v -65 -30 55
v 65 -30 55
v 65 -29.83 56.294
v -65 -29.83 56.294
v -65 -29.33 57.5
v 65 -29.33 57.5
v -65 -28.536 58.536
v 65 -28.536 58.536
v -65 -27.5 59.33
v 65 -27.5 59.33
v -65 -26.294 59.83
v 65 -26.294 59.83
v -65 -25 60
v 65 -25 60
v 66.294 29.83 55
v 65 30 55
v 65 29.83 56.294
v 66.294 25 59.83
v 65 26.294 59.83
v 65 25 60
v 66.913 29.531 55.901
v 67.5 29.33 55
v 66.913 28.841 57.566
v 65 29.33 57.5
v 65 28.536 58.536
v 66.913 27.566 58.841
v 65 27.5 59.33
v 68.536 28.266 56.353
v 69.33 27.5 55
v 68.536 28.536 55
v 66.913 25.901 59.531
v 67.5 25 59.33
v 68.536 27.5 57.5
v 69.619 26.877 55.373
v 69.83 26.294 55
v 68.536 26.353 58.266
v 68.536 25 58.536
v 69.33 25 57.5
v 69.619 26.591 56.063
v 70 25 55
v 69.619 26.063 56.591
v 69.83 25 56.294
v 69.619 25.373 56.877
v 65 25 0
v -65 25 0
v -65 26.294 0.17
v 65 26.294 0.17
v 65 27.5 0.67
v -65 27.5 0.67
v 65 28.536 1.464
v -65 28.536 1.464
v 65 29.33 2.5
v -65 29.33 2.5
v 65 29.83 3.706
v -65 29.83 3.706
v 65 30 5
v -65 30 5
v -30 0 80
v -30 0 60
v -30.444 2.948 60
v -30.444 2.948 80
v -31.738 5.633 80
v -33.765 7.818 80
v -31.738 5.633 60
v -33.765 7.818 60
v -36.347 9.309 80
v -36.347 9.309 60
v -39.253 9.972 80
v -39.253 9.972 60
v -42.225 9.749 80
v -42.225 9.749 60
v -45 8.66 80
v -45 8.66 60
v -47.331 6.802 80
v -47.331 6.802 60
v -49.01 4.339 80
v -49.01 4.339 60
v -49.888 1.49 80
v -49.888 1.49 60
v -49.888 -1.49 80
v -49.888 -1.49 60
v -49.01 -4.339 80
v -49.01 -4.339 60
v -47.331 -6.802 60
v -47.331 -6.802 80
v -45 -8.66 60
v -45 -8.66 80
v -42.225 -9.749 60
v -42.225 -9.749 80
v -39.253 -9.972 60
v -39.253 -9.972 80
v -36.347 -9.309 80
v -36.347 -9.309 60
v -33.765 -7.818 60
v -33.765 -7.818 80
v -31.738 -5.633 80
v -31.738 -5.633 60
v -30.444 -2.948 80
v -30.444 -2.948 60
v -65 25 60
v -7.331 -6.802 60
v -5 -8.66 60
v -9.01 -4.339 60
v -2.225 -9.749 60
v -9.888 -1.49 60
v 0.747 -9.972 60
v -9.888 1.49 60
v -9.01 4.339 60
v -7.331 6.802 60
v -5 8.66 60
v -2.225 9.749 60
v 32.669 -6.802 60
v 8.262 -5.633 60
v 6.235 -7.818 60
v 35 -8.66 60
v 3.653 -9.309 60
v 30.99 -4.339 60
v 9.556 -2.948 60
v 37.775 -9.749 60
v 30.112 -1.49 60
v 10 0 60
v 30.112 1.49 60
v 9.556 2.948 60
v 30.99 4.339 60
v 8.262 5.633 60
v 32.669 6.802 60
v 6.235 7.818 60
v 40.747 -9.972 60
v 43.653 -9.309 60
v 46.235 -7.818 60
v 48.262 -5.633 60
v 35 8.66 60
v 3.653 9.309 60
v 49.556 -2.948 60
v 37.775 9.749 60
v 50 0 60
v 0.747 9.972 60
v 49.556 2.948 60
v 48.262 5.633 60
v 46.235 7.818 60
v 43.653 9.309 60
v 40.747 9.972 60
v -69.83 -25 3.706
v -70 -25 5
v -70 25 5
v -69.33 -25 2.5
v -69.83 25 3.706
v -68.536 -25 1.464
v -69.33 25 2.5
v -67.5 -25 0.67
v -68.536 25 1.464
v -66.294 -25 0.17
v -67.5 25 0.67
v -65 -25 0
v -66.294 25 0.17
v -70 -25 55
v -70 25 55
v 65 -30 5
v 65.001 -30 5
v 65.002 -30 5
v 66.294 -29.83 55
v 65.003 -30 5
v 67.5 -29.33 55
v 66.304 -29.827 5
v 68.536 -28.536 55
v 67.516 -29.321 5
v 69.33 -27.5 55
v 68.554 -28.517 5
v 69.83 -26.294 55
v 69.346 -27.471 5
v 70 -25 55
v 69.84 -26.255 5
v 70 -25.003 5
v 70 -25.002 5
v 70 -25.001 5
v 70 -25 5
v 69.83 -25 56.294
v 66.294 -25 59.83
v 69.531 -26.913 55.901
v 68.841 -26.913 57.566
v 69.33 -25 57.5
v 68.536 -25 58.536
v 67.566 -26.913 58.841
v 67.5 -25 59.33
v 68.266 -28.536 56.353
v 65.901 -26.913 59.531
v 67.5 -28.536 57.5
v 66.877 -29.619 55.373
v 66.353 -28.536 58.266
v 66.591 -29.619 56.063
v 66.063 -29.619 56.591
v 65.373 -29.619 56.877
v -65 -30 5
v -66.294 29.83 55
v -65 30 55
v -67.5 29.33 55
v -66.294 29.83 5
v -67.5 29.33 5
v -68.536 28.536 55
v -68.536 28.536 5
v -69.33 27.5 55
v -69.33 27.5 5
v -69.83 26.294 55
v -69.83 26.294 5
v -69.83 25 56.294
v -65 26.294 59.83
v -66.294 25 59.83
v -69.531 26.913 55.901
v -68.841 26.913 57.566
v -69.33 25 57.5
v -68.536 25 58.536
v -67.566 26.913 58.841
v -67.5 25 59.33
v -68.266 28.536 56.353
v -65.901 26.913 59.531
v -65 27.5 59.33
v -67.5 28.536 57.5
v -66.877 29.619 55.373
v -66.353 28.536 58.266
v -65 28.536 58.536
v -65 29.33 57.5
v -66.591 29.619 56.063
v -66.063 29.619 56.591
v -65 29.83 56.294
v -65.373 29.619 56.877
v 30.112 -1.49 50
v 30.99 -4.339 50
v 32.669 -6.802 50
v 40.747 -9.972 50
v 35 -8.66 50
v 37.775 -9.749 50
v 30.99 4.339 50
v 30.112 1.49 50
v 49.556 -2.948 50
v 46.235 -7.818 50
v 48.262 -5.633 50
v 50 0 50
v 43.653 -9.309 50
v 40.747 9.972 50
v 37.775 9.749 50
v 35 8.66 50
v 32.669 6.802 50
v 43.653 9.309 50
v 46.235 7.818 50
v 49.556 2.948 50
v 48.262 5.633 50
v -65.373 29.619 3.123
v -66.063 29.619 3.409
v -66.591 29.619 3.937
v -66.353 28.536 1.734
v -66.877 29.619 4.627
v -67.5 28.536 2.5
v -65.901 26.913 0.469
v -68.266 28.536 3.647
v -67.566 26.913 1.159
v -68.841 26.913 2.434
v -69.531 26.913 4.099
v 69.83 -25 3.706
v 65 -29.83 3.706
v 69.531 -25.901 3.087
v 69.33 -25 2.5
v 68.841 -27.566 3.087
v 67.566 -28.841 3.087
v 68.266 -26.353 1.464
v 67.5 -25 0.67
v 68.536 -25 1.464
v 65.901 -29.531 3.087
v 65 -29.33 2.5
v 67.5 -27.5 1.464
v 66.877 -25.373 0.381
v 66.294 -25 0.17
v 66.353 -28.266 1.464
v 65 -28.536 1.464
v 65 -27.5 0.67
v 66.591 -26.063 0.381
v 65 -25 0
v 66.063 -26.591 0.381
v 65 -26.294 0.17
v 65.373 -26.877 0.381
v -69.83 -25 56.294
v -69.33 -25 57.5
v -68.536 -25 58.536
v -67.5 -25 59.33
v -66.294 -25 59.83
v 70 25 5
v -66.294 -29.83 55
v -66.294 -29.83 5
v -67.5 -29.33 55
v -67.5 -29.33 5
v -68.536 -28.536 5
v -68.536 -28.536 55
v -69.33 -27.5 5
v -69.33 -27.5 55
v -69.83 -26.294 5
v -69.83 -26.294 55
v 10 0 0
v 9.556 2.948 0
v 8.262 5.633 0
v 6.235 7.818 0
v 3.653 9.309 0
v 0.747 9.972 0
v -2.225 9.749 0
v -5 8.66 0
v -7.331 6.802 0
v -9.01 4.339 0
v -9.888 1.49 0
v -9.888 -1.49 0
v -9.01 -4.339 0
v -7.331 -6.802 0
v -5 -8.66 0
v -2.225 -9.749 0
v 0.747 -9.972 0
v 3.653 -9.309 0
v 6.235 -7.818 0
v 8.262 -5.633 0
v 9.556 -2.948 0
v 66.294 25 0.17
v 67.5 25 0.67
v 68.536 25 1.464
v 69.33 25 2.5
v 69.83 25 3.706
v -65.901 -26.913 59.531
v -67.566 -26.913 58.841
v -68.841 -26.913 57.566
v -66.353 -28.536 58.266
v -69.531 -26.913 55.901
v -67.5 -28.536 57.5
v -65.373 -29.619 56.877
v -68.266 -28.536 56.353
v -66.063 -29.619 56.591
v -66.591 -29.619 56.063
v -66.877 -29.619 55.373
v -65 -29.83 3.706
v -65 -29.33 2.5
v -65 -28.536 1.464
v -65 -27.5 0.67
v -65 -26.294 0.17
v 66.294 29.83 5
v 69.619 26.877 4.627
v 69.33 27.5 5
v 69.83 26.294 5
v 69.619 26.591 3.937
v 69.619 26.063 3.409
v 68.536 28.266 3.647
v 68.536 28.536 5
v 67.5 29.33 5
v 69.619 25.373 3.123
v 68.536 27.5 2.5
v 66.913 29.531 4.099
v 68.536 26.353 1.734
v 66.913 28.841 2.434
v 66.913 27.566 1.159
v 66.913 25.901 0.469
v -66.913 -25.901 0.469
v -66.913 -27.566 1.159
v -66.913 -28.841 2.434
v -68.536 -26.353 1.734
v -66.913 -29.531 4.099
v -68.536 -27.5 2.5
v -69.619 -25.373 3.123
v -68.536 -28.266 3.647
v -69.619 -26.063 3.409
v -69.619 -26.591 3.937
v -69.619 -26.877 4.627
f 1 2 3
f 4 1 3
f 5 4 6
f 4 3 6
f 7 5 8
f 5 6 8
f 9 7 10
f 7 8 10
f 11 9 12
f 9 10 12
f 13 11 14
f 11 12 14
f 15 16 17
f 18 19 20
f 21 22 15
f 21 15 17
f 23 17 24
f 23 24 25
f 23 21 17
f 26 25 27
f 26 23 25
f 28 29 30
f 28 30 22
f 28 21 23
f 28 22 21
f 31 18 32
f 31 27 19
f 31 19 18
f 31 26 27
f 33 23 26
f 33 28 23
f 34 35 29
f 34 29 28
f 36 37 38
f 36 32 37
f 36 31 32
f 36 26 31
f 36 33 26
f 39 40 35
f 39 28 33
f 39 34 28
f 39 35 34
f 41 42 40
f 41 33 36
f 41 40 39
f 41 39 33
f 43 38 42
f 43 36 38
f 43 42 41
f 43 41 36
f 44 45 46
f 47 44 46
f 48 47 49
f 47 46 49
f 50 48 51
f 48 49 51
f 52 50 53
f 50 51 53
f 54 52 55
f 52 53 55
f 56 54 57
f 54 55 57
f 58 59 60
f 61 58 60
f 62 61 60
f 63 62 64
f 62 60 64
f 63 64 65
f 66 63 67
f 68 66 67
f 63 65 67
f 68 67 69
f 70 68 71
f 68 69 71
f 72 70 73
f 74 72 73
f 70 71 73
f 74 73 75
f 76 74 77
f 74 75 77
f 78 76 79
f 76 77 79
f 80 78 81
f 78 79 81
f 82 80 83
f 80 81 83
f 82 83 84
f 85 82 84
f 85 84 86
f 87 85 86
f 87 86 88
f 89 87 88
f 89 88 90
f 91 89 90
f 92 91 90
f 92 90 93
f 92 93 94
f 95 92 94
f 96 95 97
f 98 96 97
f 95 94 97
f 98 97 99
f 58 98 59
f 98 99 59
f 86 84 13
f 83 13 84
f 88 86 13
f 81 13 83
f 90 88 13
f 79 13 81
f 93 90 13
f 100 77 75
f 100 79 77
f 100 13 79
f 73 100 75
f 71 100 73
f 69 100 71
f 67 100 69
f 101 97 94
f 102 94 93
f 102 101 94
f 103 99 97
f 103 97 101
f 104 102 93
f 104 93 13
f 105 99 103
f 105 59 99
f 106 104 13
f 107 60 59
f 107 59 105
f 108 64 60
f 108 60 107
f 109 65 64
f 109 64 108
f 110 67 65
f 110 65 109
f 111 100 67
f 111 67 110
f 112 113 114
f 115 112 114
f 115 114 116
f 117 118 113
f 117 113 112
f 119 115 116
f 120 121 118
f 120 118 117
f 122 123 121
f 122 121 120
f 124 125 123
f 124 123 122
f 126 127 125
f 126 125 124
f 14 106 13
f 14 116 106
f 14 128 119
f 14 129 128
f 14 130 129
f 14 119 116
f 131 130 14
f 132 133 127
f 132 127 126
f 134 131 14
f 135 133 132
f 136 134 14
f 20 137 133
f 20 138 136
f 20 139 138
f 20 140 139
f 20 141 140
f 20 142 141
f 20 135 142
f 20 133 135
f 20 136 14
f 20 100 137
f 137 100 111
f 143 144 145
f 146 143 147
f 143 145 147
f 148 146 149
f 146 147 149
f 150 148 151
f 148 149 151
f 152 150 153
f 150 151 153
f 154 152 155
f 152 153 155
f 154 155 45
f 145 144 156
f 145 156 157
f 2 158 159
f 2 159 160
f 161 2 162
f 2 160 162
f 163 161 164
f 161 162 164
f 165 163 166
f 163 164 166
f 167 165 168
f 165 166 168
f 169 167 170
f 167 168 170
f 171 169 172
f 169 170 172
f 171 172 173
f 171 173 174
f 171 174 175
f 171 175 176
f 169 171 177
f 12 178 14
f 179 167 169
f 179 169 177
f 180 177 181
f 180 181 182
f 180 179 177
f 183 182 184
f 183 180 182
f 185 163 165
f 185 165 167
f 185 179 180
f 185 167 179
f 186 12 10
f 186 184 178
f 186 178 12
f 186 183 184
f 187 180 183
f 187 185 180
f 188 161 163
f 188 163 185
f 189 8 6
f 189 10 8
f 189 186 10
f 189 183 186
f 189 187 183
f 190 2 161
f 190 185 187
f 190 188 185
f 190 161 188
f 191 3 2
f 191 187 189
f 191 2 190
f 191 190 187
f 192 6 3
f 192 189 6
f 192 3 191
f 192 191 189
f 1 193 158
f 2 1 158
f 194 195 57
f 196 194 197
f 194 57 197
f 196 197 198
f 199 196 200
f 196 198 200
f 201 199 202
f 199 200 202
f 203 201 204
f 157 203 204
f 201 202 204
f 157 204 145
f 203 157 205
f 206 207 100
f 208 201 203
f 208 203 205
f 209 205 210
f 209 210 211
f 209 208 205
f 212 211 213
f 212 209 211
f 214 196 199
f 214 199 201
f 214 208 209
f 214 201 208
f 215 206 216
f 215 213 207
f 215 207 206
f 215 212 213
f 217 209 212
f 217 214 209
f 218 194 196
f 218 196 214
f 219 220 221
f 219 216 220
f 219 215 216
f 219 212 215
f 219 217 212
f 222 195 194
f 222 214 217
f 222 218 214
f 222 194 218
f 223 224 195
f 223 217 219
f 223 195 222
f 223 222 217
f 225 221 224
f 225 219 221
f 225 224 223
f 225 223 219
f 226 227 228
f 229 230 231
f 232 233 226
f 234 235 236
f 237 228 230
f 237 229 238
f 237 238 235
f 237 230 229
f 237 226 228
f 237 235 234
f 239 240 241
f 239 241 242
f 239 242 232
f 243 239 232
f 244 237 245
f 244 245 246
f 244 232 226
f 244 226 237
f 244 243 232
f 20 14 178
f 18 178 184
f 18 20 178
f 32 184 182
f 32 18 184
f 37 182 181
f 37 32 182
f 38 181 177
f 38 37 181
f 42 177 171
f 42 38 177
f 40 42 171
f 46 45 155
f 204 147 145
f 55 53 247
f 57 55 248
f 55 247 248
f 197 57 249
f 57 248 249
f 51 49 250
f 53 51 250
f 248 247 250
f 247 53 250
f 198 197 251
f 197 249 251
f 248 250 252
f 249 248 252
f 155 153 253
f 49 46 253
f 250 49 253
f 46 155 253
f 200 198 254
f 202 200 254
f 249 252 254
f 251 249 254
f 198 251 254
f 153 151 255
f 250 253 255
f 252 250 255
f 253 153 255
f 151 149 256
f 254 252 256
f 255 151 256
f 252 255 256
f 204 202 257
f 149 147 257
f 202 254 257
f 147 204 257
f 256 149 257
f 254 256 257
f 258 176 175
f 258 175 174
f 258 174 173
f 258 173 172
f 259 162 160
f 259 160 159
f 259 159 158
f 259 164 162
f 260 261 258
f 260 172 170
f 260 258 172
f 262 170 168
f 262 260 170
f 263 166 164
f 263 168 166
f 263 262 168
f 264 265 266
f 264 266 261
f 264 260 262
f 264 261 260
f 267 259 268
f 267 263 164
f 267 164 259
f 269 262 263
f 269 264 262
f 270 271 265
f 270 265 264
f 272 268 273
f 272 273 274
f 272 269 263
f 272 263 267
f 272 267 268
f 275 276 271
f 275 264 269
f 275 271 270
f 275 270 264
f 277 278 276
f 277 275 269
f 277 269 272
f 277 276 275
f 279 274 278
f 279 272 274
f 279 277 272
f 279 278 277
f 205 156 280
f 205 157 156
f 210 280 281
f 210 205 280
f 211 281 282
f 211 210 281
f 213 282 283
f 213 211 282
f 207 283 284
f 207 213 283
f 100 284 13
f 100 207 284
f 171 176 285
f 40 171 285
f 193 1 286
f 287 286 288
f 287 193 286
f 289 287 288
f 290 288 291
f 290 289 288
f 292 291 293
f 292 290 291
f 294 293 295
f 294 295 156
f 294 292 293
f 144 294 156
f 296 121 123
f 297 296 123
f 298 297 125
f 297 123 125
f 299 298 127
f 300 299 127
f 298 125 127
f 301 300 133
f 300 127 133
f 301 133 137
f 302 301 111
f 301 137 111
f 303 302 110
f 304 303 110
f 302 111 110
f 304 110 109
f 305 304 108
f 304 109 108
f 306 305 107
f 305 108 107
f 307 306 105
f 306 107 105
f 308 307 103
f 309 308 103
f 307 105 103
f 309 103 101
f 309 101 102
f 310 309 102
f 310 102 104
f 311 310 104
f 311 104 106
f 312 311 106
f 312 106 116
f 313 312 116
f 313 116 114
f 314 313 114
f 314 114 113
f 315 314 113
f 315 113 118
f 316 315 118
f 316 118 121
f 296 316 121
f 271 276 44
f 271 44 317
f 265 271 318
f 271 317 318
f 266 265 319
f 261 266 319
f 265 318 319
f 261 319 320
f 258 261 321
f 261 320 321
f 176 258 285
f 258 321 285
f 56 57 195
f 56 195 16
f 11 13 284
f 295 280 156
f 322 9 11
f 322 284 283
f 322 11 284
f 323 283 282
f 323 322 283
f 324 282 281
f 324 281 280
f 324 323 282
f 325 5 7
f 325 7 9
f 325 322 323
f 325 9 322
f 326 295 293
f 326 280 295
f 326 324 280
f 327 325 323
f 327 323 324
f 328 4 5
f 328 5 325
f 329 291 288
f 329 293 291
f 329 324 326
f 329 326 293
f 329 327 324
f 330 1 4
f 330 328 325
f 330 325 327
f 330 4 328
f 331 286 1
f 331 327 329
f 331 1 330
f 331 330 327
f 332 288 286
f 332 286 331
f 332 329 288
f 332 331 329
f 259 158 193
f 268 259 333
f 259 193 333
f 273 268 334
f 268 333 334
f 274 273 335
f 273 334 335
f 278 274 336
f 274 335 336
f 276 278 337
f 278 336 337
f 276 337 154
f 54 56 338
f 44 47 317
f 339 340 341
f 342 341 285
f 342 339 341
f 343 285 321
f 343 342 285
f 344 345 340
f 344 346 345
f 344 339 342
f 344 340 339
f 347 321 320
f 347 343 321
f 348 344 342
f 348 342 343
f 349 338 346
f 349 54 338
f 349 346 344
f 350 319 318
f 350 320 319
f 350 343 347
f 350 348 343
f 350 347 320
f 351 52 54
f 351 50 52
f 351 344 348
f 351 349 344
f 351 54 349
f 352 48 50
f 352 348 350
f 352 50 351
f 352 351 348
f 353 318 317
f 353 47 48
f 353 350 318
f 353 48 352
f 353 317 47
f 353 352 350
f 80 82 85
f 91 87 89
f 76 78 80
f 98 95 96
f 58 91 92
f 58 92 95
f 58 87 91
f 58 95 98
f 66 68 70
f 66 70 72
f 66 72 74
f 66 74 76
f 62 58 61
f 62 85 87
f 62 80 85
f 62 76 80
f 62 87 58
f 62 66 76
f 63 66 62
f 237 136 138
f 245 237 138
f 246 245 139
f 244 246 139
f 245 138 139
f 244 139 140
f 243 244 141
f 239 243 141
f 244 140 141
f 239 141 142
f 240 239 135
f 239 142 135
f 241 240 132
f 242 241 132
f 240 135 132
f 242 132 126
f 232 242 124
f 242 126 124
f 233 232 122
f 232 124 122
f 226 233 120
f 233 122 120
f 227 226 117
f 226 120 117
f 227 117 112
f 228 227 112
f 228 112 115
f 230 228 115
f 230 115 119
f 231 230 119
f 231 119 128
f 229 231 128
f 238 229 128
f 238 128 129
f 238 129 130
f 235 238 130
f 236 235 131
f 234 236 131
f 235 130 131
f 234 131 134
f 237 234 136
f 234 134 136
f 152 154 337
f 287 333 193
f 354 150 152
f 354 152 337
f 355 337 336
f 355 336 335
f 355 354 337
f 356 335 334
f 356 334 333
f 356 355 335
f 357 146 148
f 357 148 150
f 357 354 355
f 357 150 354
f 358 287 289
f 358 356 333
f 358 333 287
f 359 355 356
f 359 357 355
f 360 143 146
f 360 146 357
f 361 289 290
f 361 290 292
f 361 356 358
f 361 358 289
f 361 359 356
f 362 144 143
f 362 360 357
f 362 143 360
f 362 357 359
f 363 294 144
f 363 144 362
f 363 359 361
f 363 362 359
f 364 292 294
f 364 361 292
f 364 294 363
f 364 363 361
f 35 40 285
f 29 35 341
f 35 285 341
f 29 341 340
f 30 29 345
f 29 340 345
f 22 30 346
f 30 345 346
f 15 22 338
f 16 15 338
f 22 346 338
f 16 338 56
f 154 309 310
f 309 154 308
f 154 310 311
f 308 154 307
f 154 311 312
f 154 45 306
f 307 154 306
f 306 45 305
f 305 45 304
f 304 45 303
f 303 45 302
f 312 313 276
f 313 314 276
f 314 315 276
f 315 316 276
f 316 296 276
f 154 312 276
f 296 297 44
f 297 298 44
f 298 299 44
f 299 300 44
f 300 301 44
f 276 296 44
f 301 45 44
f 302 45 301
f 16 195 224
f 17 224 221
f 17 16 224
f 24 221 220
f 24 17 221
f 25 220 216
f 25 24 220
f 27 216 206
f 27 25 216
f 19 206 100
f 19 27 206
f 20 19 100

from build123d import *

# Parameters (mm, degrees)
F0_W          = 140
F0_H          = 60
F1_DEPTH      = 60
F2_R          = 10
F5_DEPTH      = 20
F4_R          = 10
F6_DEPTH      = 71.6
F3_R          = 10
F7_DEPTH      = 10
F8_R          = 5
F9_T1_DEPTH   = 165
F9_T3_DEPTH   = 67.5
F9_S7_W       = 5
F9_S7_H       = 5
F9_T8_DEPTH   = 5
F10_T1_DEPTH  = 50
F10_T3_DEPTH  = 67.5
F10_S7_W      = 5
F10_S7_H      = 5
F10_T8_DEPTH  = 5
F10_T12_ANGLE = 89.9999999974
F11_T1_DEPTH  = 147.5
F11_T3_DEPTH  = 50
F11_S7_W      = 5
F11_S7_H      = 5
F11_T8_DEPTH  = 5
F11_T12_ANGLE = 89.9999999974
F12_T1_DEPTH  = 50
F12_T3_DEPTH  = 50
F12_S7_W      = 5
F12_S7_H      = 5
F12_T8_DEPTH  = 5
F12_S13_W     = 5
F12_S13_H     = 5
F12_T14_DEPTH = 5
F12_T18_ANGLE = 89.9999999974


# Not quite as in the source:
# - a fillet or chamfer that OpenCascade refuses, or shapes differently, is made with other operations: its cross-section is extruded or revolved along the edge and cut away or added


with BuildPart() as f1:
    # F0 (on Top) → F1 (new body)
    with BuildSketch(Plane.XY):
        Rectangle(F0_W, F0_H)
    extrude(amount=F1_DEPTH)

    # F2 (on face) → F5 (join)
    with BuildSketch(Plane.XY.offset(60)):
        with Locations((-40, 0)):
            Circle(F2_R)
    extrude(amount=F5_DEPTH)

    # F4 (on face) → F6 (cut)
    with BuildSketch(Plane.XY.offset(60)):
        Circle(F4_R)
    extrude(amount=-F6_DEPTH, mode=Mode.SUBTRACT)

    # F3 (on face) → F7 (cut)
    with BuildSketch(Plane.XY.offset(60)):
        with Locations((40, 0)):
            Circle(F3_R)
    extrude(amount=-F7_DEPTH, mode=Mode.SUBTRACT)

    # F8
    f8_edges = [f1.edges().sort_by_distance(p)[0] for p in [
        (0, 30, 60),
        (-70, 0, 60),
        (0, -30, 60),
        (70, 0, 60),
    ]]
    fillet(f8_edges, radius=F8_R)

    # F9: fillet of radius 5 on 2 edges, made by hand

    # F9_s2 → F9_t1 (cut)
    with BuildSketch(Plane.YZ.offset(-82.5)):
        with BuildLine():
            ThreePointArc((-30, 5), (-28.5355339059, 1.4644660941), (-25, 0))
            Line((-25, 0), (-30, 0))
            Line((-30, 0), (-30, 5))
        make_face()
    extrude(amount=F9_T1_DEPTH, mode=Mode.SUBTRACT)

    # F9_s4 → F9_t3 (cut)
    with BuildSketch(Plane.XY.offset(-12.5)):
        with BuildLine():
            ThreePointArc((65, -30), (68.5355339059, -28.5355339059), (70, -25))
            Line((70, -25), (70, -30))
            Line((70, -30), (65, -30))
        make_face()
    extrude(amount=F9_T3_DEPTH, mode=Mode.SUBTRACT)


with BuildPart() as f9_tool6:
    # F9_s7 → F9_t8 (new body)
    with BuildSketch(Plane.XZ.offset(25)):
        with Locations((67.5, 57.5)):
            Rectangle(F9_S7_W, F9_S7_H)
    extrude(amount=F9_T8_DEPTH)

    # F9_s9 → F9_t10 (revolve, cut)
    with BuildSketch(Plane(origin=(65, -25, 55), x_dir=(-0.7071067812, 0, -0.7071067812), z_dir=(-0.7071067812, 0, 0.7071067812))):
        with BuildLine():
            ThreePointArc((0, -5), (5, 0), (0, 5))
            Line((0, 5), (0, -5))
        make_face()
    revolve(axis=Axis((65, -25, 55), (0, -1, 0)), mode=Mode.SUBTRACT)


with BuildPart() as f1_1:
    add(f1.part)

    # F9_t5: cut F9_tool6
    add(f9_tool6.part, mode=Mode.SUBTRACT)

    # F10: fillet of radius 5 on 1 edges, made by hand

    # F10_s2 → F10_t1 (cut)
    with BuildSketch(Plane.XY.offset(5)):
        with BuildLine():
            ThreePointArc((-65, -30), (-68.5355339059, -28.5355339059), (-70, -25))
            Line((-70, -25), (-70, -30))
            Line((-70, -30), (-65, -30))
        make_face()
    extrude(amount=F10_T1_DEPTH, mode=Mode.SUBTRACT)

    # F10_s4 → F10_t3 (cut)
    with BuildSketch(Plane.XZ.offset(-42.5)):
        with BuildLine():
            ThreePointArc((-70, 5), (-68.5355339059, 1.4644660941), (-65, 0))
            Line((-65, 0), (-70, 0))
            Line((-70, 0), (-70, 5))
        make_face()
    extrude(amount=F10_T3_DEPTH, mode=Mode.SUBTRACT)


with BuildPart() as f10_tool6:
    # F10_s7 → F10_t8 (new body)
    with BuildSketch(Plane.XZ.offset(25)):
        with Locations((-67.5, 57.5)):
            Rectangle(F10_S7_W, F10_S7_H)
    extrude(amount=F10_T8_DEPTH)

    # F10_s9 → F10_t10 (revolve, cut)
    with BuildSketch(Plane(origin=(-65, -25, 55), x_dir=(0.7071067812, 0, -0.7071067812), z_dir=(-0.7071067812, 0, -0.7071067812))):
        with BuildLine():
            ThreePointArc((0, -5), (5, 0), (0, 5))
            Line((0, 5), (0, -5))
        make_face()
    revolve(axis=Axis((-65, -25, 55), (0, -1, 0)), mode=Mode.SUBTRACT)


with BuildPart() as f1_2:
    add(f1_1.part)

    # F10_t5: cut F10_tool6
    add(f10_tool6.part, mode=Mode.SUBTRACT)

    # F10_s11 → F10_t12 (revolve, cut)
    with BuildSketch(Plane.XZ.offset(24.9999999999)):
        with BuildLine():
            ThreePointArc((-65, 0), (-68.5355339059, 1.4644660941), (-70, 5))
            Line((-70, 5), (-70, 0))
            Line((-70, 0), (-65, 0))
        make_face()
    revolve(axis=Axis((-70, -24.9999999999, 5.0000000001), (-1, 0, 0)), revolution_arc=F10_T12_ANGLE, mode=Mode.SUBTRACT)

    # F11: fillet of radius 5 on 1 edges, made by hand

    # F11_s2 → F11_t1 (cut)
    with BuildSketch(Plane.YZ.offset(-65)):
        with BuildLine():
            ThreePointArc((25, 0), (28.5355339059, 1.4644660941), (30, 5))
            Line((30, 5), (30, 0))
            Line((30, 0), (25, 0))
        make_face()
    extrude(amount=F11_T1_DEPTH, mode=Mode.SUBTRACT)

    # F11_s4 → F11_t3 (cut)
    with BuildSketch(Plane.XY.offset(5)):
        with BuildLine():
            ThreePointArc((-65, 30), (-68.5355339059, 28.5355339059), (-70, 25))
            Line((-70, 25), (-70, 30))
            Line((-70, 30), (-65, 30))
        make_face()
    extrude(amount=F11_T3_DEPTH, mode=Mode.SUBTRACT)


with BuildPart() as f11_tool6:
    # F11_s7 → F11_t8 (new body)
    with BuildSketch(Plane.XZ.offset(-25)):
        with Locations((-67.5, 57.5)):
            Rectangle(F11_S7_W, F11_S7_H)
    extrude(amount=-F11_T8_DEPTH)

    # F11_s9 → F11_t10 (revolve, cut)
    with BuildSketch(Plane(origin=(-65, 25, 55), x_dir=(0.7071067812, 0, -0.7071067812), z_dir=(0.7071067812, 0, 0.7071067812))):
        with BuildLine():
            ThreePointArc((0, -5), (5, 0), (0, 5))
            Line((0, 5), (0, -5))
        make_face()
    revolve(axis=Axis((-65, 25, 55), (0, 1, 0)), mode=Mode.SUBTRACT)


with BuildPart() as f1_3:
    add(f1_2.part)

    # F11_t5: cut F11_tool6
    add(f11_tool6.part, mode=Mode.SUBTRACT)

    # F11_s11 → F11_t12 (revolve, cut)
    with BuildSketch(Plane.YZ.offset(-64.9999999999)):
        with BuildLine():
            ThreePointArc((30, 5), (28.5355339059, 1.4644660941), (25, 0))
            Line((25, 0), (30, 0))
            Line((30, 0), (30, 5))
        make_face()
    revolve(axis=Axis((-64.9999999999, 30, 5.0000000001), (0, 1, 0)), revolution_arc=F11_T12_ANGLE, mode=Mode.SUBTRACT)

    # F12: fillet of radius 5 on 1 edges, made by hand

    # F12_s2 → F12_t1 (cut)
    with BuildSketch(Plane.XY.offset(5)):
        with BuildLine():
            ThreePointArc((70, 25), (68.5355339059, 28.5355339059), (65, 30))
            Line((65, 30), (70, 30))
            Line((70, 30), (70, 25))
        make_face()
    extrude(amount=F12_T1_DEPTH, mode=Mode.SUBTRACT)

    # F12_s4 → F12_t3 (cut)
    with BuildSketch(Plane.XZ.offset(-25)):
        with BuildLine():
            ThreePointArc((65, 0), (68.5355339059, 1.4644660941), (70, 5))
            Line((70, 5), (70, 0))
            Line((70, 0), (65, 0))
        make_face()
    extrude(amount=F12_T3_DEPTH, mode=Mode.SUBTRACT)


with BuildPart() as f12_tool6:
    # F12_s7 → F12_t8 (new body)
    with BuildSketch(Plane.YZ.offset(65)):
        with Locations((27.5, 57.5)):
            Rectangle(F12_S7_W, F12_S7_H)
    extrude(amount=F12_T8_DEPTH)

    # F12_s9 → F12_t10 (revolve, cut)
    with BuildSketch(Plane(origin=(65, 25, 55), x_dir=(0, -0.7071067812, -0.7071067812), z_dir=(0, -0.7071067812, 0.7071067812))):
        with BuildLine():
            ThreePointArc((0, -5), (5, 0), (0, 5))
            Line((0, 5), (0, -5))
        make_face()
    revolve(axis=Axis((65, 25, 55), (1, 0, 0)), mode=Mode.SUBTRACT)


with BuildPart() as f1_4:
    add(f1_3.part)

    # F12_t5: cut F12_tool6
    add(f12_tool6.part, mode=Mode.SUBTRACT)


with BuildPart() as f12_tool12:
    # F12_s13 → F12_t14 (new body)
    with BuildSketch(Plane.XY.offset(5)):
        with Locations((67.5, -27.5)):
            Rectangle(F12_S13_W, F12_S13_H)
    extrude(amount=-F12_T14_DEPTH)

    # F12_s15 → F12_t16 (revolve, cut)
    with BuildSketch(Plane(origin=(65, -25, 5), x_dir=(-0.7071067812, 0.7071067812, 0), z_dir=(-0.7071067812, -0.7071067812, 0))):
        with BuildLine():
            ThreePointArc((0, -5), (5, 0), (0, 5))
            Line((0, 5), (0, -5))
        make_face()
    revolve(axis=Axis((65, -25, 5), (0, 0, -1)), mode=Mode.SUBTRACT)


with BuildPart() as f1_5:
    add(f1_4.part)

    # F12_t11: cut F12_tool12
    add(f12_tool12.part, mode=Mode.SUBTRACT)

    # F12_s17 → F12_t18 (revolve, cut)
    with BuildSketch(Plane.XY.offset(5.0000000001)):
        with BuildLine():
            ThreePointArc((70, 25), (68.5355339059, 28.5355339059), (65, 30))
            Line((65, 30), (70, 30))
            Line((70, 30), (70, 25))
        make_face()
    revolve(axis=Axis((70, 24.9999999999, 5.0000000001), (-1, 0, 0)), revolution_arc=F12_T18_ANGLE, mode=Mode.SUBTRACT)


solid = f1_5.part
